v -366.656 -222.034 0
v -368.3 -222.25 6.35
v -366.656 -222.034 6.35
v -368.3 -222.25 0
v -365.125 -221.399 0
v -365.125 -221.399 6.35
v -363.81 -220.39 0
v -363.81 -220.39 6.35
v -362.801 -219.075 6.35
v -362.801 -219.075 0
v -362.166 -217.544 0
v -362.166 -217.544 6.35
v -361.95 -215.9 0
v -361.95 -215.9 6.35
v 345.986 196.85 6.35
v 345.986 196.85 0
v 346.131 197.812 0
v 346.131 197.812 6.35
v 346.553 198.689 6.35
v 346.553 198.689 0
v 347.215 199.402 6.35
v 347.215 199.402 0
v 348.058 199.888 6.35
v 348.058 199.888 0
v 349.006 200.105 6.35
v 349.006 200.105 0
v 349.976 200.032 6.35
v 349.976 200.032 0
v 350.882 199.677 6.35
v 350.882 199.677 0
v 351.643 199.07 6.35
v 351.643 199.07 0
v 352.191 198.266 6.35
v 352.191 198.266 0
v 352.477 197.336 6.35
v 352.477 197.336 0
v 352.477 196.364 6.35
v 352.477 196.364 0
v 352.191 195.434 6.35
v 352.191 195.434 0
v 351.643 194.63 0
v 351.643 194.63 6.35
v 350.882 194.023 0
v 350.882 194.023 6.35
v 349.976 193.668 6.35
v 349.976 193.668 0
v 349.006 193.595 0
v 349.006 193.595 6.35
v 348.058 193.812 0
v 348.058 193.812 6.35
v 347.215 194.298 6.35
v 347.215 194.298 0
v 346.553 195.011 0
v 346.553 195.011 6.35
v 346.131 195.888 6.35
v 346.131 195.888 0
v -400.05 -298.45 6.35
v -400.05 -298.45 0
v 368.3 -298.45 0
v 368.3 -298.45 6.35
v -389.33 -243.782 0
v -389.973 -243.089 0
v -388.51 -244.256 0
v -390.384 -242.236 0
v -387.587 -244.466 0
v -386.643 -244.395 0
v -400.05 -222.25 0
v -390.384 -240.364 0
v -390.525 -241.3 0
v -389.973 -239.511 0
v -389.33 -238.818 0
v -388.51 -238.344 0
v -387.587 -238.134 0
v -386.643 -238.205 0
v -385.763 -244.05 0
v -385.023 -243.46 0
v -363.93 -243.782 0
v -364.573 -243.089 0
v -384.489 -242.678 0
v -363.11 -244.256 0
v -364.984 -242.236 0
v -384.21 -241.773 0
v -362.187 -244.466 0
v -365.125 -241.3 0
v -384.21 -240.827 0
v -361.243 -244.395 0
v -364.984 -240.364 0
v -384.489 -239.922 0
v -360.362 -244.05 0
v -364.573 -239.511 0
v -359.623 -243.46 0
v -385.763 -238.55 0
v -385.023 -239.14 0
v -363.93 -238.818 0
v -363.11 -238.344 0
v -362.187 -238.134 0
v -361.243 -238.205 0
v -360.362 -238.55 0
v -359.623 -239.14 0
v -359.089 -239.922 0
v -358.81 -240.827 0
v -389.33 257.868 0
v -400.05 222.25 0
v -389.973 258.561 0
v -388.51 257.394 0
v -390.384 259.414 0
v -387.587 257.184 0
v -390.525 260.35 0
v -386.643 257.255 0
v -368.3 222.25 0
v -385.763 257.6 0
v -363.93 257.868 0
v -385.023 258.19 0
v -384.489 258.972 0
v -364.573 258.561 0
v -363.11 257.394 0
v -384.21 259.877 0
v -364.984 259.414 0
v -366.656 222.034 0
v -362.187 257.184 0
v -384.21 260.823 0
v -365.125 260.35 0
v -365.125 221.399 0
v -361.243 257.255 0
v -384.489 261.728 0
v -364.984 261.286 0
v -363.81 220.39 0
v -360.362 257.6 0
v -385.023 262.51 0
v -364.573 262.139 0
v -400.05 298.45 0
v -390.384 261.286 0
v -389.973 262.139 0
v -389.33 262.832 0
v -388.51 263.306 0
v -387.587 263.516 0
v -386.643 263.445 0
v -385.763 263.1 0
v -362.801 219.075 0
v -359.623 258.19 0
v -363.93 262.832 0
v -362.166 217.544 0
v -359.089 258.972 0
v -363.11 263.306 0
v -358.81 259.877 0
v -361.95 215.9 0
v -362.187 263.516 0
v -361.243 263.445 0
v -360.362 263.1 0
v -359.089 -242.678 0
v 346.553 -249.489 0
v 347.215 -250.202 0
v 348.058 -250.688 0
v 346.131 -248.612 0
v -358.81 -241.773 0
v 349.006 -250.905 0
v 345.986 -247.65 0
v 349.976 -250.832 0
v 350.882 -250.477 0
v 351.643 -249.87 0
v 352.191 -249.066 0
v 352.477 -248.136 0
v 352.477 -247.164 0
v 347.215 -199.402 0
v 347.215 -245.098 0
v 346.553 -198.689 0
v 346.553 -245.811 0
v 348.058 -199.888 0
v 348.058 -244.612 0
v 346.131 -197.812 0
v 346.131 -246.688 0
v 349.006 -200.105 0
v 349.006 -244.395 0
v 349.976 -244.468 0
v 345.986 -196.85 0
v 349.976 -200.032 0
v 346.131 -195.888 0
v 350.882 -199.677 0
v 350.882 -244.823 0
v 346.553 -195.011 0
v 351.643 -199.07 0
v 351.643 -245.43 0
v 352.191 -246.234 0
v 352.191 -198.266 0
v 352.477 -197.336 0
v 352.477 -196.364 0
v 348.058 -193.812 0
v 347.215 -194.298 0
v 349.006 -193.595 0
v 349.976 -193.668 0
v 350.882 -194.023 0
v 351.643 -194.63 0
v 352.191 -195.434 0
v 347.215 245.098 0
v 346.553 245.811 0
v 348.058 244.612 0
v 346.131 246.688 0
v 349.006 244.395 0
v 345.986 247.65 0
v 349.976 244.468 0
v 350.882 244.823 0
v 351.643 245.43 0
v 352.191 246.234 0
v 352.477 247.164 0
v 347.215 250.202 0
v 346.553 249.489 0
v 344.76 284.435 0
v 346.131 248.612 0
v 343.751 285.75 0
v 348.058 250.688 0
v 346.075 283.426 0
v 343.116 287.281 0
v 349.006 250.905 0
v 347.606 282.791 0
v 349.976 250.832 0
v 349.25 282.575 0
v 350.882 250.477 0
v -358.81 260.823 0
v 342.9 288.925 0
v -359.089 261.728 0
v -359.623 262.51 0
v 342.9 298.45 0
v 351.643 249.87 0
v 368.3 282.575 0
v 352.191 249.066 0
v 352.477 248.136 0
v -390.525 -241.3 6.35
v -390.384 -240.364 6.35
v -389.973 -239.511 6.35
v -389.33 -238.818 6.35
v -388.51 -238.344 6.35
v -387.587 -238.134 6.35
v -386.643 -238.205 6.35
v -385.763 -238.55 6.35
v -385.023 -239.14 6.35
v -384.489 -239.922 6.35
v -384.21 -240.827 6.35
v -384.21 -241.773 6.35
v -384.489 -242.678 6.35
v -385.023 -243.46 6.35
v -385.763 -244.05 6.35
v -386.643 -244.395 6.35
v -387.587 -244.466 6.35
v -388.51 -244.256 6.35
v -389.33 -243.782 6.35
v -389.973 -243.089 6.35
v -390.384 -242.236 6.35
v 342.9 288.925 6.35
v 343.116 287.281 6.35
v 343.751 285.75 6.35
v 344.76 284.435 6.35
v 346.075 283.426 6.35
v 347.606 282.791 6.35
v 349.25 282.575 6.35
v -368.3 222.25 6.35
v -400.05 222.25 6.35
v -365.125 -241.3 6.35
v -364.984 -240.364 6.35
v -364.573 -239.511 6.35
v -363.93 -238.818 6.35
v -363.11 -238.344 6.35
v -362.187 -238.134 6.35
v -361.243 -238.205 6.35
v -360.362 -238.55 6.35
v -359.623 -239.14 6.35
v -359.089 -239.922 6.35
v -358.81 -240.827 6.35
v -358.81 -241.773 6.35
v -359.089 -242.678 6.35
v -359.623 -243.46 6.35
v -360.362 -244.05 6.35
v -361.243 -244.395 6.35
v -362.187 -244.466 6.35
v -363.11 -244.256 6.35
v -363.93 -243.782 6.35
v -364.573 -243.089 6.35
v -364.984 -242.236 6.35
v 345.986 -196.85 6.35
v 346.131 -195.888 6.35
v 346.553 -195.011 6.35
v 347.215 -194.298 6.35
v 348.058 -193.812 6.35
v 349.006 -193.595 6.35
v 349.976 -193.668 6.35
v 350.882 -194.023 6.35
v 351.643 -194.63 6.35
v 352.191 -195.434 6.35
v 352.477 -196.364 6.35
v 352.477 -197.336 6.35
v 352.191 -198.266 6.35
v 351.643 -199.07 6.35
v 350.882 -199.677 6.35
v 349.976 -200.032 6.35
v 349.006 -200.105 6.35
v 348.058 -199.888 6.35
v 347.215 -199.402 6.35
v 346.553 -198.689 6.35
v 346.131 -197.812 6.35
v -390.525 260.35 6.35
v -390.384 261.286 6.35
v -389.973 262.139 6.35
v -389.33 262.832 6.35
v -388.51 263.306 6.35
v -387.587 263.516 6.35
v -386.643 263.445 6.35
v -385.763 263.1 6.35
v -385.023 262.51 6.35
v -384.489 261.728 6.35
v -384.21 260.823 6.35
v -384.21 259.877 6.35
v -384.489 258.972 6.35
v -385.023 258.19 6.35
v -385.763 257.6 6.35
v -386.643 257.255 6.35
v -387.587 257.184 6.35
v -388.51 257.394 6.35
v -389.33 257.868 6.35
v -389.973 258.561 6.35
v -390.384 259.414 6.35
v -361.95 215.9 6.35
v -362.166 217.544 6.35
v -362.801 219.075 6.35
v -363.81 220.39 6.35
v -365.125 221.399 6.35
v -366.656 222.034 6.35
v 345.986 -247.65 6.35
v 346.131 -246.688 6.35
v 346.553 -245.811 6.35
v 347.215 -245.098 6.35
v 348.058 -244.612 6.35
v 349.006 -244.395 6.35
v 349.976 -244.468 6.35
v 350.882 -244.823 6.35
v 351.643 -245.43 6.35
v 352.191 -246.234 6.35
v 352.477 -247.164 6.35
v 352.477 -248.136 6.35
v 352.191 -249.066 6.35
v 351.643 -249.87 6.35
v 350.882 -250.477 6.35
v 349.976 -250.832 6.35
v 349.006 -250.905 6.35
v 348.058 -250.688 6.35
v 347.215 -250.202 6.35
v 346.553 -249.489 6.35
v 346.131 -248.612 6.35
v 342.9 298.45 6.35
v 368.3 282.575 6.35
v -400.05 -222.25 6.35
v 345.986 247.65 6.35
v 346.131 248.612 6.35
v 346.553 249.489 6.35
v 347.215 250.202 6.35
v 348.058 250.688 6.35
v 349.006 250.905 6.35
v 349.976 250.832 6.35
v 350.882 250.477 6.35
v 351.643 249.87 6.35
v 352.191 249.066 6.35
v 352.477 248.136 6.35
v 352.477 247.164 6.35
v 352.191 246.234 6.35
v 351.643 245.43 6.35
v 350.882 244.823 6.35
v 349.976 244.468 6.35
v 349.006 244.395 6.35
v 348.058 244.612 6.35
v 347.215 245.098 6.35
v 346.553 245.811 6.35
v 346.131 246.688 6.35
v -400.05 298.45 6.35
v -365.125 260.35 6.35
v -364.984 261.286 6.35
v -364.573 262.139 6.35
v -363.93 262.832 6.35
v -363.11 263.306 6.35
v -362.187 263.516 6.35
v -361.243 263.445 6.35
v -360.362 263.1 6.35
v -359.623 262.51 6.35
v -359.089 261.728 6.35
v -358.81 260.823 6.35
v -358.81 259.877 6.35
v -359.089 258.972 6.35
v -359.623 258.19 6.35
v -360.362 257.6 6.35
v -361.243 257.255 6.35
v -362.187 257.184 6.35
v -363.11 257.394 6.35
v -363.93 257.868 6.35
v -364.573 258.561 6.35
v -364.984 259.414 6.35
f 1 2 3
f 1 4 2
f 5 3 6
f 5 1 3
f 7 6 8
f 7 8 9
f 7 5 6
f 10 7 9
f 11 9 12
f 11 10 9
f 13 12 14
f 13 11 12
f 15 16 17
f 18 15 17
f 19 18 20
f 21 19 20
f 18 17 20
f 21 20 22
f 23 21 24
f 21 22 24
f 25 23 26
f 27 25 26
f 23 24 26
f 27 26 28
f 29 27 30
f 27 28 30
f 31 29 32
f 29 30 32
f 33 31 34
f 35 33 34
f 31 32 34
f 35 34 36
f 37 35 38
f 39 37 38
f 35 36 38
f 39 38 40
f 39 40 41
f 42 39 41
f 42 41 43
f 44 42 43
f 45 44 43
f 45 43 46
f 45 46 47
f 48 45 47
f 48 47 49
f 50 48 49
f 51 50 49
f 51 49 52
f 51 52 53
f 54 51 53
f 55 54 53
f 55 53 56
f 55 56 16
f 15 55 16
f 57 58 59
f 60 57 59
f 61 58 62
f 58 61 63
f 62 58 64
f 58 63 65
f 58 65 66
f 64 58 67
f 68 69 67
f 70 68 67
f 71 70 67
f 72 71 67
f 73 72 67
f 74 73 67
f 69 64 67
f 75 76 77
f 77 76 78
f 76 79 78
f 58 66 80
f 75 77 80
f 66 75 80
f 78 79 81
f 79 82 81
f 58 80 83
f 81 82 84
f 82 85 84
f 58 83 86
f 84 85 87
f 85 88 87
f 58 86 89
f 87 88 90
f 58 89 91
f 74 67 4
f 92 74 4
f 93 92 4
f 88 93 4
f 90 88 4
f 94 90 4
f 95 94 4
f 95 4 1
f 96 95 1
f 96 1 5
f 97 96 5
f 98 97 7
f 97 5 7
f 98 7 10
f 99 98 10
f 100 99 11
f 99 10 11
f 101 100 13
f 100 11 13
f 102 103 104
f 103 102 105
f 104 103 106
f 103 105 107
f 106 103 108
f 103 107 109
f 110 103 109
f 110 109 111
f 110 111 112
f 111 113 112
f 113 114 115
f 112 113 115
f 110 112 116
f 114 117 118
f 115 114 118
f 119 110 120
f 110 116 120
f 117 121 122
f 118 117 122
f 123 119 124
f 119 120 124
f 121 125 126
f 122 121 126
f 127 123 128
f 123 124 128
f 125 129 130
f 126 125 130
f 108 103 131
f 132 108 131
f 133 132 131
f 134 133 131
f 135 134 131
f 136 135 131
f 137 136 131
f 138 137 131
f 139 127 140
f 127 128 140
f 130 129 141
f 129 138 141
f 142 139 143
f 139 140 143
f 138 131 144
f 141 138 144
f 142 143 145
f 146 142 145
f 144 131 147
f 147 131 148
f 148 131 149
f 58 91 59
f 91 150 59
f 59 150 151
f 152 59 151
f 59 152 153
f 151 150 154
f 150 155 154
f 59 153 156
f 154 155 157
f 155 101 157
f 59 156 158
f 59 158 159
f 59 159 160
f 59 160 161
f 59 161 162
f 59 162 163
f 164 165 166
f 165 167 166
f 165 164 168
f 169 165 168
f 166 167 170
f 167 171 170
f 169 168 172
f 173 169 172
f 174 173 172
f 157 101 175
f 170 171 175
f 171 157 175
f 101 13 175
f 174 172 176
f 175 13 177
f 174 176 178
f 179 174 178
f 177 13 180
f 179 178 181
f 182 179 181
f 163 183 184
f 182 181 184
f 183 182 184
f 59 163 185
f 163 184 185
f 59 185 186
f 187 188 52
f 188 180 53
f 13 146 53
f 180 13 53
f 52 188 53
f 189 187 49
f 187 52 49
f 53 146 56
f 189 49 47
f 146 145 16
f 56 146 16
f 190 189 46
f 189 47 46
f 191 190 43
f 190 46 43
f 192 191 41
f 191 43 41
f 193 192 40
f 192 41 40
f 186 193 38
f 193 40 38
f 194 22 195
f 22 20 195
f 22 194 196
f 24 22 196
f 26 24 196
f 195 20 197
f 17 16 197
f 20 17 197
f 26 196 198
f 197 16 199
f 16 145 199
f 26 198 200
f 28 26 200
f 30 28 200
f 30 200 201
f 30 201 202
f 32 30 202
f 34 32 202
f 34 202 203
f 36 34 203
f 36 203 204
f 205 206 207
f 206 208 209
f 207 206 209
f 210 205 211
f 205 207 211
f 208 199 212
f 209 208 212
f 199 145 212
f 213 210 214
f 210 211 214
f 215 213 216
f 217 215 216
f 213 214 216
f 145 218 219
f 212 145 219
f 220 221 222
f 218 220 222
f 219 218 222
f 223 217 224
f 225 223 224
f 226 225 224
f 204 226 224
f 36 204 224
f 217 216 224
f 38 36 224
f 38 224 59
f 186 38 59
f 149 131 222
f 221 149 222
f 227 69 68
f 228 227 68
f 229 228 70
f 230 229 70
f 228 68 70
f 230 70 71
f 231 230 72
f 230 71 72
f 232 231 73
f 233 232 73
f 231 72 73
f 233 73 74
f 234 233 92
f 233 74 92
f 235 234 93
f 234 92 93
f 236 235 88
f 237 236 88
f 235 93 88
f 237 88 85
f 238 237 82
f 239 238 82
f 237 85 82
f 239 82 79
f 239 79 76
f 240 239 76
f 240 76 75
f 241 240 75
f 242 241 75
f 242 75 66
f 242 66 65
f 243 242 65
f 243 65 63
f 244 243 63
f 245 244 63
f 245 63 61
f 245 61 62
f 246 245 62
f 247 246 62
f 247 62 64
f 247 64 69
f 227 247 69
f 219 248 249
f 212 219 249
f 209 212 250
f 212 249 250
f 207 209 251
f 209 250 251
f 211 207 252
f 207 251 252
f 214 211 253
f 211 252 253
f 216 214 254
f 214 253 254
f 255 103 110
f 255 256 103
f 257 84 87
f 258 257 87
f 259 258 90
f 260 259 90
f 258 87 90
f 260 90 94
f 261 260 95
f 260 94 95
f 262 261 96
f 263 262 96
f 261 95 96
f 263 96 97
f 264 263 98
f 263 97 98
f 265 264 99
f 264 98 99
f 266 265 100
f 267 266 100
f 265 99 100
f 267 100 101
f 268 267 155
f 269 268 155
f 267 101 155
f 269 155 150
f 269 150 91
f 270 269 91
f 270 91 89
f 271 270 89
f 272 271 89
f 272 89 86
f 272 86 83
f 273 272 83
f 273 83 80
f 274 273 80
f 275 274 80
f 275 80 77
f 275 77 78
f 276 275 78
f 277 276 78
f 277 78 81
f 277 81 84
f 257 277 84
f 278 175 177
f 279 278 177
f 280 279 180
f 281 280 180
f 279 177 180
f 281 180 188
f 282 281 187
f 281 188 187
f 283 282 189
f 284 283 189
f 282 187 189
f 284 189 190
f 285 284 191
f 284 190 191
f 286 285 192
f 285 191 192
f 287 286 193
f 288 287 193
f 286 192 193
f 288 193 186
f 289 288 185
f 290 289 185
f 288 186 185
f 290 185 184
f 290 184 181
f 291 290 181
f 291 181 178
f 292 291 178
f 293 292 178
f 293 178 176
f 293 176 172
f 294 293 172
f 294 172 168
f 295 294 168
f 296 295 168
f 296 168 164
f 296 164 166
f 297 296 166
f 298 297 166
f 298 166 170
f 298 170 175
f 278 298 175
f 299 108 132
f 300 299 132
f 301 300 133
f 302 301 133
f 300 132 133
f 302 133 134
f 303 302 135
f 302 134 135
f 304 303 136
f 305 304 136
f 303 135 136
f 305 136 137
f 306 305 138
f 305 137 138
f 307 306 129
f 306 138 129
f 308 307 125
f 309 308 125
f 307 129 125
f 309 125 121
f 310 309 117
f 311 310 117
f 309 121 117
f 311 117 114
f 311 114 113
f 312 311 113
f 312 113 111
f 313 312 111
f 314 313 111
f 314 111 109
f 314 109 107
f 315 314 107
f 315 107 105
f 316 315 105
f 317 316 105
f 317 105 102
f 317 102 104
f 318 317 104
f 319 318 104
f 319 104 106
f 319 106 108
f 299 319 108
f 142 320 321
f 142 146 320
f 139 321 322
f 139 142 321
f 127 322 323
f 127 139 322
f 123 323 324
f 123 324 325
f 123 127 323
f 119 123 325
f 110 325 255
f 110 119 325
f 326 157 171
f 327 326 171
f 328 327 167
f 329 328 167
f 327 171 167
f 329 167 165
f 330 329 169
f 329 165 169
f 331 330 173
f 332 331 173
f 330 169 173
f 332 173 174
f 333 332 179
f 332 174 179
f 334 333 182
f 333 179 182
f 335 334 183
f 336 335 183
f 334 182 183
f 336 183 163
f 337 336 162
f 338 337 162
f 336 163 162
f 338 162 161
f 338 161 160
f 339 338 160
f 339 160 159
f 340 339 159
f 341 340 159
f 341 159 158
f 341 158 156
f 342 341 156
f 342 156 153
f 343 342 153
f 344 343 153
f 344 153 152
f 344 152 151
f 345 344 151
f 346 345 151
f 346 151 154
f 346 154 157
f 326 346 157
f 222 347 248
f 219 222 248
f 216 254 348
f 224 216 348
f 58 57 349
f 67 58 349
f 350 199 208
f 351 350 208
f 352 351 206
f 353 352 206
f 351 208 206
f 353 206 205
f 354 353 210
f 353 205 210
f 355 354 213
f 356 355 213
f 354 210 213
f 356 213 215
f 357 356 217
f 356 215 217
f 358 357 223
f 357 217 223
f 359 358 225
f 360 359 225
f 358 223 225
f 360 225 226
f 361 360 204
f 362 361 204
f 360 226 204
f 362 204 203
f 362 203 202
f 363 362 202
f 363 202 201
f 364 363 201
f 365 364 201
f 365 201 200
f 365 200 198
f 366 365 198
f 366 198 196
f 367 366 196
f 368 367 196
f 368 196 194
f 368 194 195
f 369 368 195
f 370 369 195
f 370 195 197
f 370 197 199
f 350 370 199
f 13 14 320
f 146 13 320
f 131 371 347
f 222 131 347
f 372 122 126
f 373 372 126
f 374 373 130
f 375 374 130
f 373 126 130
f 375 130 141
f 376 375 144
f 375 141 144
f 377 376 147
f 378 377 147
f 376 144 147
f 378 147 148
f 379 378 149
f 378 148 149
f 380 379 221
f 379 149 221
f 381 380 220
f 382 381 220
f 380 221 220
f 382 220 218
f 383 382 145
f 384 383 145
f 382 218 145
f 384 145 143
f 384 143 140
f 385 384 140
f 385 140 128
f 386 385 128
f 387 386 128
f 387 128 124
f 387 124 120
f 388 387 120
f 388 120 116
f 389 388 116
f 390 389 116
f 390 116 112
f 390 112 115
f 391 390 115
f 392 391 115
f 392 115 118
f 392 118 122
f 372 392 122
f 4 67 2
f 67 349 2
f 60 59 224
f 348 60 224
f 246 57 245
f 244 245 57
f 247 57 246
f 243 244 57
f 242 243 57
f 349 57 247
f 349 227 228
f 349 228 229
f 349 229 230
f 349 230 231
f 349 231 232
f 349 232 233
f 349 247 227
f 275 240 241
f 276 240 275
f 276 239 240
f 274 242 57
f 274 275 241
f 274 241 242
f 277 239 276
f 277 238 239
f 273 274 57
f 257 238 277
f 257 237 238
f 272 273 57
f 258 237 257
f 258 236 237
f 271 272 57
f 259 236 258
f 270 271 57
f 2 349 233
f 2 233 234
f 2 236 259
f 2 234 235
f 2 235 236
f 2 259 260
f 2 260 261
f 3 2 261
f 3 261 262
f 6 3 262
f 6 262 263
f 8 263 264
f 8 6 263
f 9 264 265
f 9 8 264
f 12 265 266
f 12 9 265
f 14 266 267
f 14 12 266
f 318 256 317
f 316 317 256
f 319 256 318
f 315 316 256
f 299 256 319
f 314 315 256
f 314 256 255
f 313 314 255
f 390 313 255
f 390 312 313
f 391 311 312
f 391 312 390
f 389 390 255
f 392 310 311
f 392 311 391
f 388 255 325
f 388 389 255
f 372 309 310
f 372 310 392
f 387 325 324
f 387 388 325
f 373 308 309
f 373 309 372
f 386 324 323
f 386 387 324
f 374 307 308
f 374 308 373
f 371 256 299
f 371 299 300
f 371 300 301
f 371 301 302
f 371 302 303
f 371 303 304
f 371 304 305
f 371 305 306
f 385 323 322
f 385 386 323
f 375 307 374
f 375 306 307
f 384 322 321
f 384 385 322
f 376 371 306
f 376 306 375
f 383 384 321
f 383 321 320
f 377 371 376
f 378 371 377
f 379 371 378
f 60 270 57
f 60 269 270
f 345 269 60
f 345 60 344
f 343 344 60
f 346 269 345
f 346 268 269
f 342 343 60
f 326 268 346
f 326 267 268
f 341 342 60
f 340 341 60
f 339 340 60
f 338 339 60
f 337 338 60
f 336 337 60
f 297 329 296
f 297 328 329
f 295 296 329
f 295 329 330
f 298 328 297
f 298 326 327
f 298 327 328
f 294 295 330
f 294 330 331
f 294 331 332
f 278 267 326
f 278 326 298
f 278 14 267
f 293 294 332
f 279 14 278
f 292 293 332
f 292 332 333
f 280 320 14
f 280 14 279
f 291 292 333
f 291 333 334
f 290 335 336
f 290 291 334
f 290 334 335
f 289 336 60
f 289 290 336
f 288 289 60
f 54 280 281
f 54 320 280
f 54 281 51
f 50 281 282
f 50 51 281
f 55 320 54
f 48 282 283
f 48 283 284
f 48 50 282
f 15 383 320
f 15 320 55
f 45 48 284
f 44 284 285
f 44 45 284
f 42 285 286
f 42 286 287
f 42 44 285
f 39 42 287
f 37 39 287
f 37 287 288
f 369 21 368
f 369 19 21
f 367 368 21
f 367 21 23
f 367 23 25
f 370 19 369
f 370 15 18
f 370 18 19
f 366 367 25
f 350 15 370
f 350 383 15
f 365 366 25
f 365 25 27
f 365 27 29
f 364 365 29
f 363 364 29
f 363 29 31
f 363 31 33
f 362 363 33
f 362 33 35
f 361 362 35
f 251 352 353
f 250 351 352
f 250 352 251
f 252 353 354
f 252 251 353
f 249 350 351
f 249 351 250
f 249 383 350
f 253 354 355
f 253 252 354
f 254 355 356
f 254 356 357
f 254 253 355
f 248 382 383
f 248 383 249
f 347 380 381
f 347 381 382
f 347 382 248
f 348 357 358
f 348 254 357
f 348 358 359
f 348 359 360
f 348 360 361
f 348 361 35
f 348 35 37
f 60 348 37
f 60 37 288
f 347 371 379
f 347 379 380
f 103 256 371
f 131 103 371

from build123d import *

# Parameters (mm, degrees)
SKETCH1_W                   = 736.6
SKETCH1_H                   = 596.9
BOSS_EXTRUDE1_DEPTH         = 6.35
SKETCH5_W                   = 31.75
SKETCH5_H                   = 76.2
BOSS_EXTRUDE2_DEPTH         = 6.35
SKETCH6_W                   = 6.35
SKETCH6_H                   = 444.5
CUT_EXTRUDE1_DEPTH          = 7.35
FILLET1_R                   = 6.35
F_0_257_DIAMETER_HOLE1_D    = 6.5278
F_1_4_0_25_DIAMETER_HOLE2_D = 6.35
CUT_EXTRUDE2_DEPTH          = 7.35


with BuildPart() as part:
    # Sketch1 → Boss-Extrude1 (new body)
    with BuildSketch(Plane.XY):
        Rectangle(SKETCH1_W, SKETCH1_H)
    extrude(amount=BOSS_EXTRUDE1_DEPTH)

    # Sketch5 → Boss-Extrude2 (add)
    with BuildSketch(Plane.XY.offset(6.35)):
        with Locations((-384.175, 260.35)):
            Rectangle(SKETCH5_W, SKETCH5_H)
        with Locations((-384.175, -260.35)):
            Rectangle(SKETCH5_W, SKETCH5_H)
    extrude(amount=-BOSS_EXTRUDE2_DEPTH)

    # Sketch6 → Cut-Extrude1 (cut, through all)
    with BuildSketch(Plane.XY.offset(6.35)):
        with Locations((-365.125, 0)):
            Rectangle(SKETCH6_W, SKETCH6_H)
    extrude(amount=-CUT_EXTRUDE1_DEPTH, mode=Mode.SUBTRACT)

    # Fillet1
    fillet1_edges = [part.edges().sort_by_distance(p)[0] for p in [
        (-361.95, -222.25, 3.175),
        (-361.95, 222.25, 3.175),
    ]]
    fillet(fillet1_edges, radius=FILLET1_R)

    # F (0.257) Diameter Hole1 (through all)
    with Locations(Plane.XY.offset(6.35)):
        with Locations((349.25, 247.65), (349.25, 196.85), (349.25, -196.85), (349.25, -247.65)):
            Hole(F_0_257_DIAMETER_HOLE1_D / 2)

    # 1/4 (0.25) Diameter Hole2 (through all)
    with Locations(Plane.XY.offset(6.35)):
        with Locations((-387.35, 260.35), (-361.95, 260.35), (-361.95, -241.3), (-387.35, -241.3)):
            Hole(F_1_4_0_25_DIAMETER_HOLE2_D / 2)

    # Sketch13 → Cut-Extrude2 (cut, through all)
    with BuildSketch(Plane.XY.offset(6.35)):
        with BuildLine():
            Line((368.3, 298.45), (342.9, 298.45))
            Line((342.9, 298.45), (342.9, 288.925))
            ThreePointArc((342.9, 288.925), (344.759871939, 284.434871939), (349.25, 282.575))
            Line((349.25, 282.575), (368.3, 282.575))
            Line((368.3, 282.575), (368.3, 298.45))
        make_face()
    extrude(amount=-CUT_EXTRUDE2_DEPTH, mode=Mode.SUBTRACT)


solid = part.part
